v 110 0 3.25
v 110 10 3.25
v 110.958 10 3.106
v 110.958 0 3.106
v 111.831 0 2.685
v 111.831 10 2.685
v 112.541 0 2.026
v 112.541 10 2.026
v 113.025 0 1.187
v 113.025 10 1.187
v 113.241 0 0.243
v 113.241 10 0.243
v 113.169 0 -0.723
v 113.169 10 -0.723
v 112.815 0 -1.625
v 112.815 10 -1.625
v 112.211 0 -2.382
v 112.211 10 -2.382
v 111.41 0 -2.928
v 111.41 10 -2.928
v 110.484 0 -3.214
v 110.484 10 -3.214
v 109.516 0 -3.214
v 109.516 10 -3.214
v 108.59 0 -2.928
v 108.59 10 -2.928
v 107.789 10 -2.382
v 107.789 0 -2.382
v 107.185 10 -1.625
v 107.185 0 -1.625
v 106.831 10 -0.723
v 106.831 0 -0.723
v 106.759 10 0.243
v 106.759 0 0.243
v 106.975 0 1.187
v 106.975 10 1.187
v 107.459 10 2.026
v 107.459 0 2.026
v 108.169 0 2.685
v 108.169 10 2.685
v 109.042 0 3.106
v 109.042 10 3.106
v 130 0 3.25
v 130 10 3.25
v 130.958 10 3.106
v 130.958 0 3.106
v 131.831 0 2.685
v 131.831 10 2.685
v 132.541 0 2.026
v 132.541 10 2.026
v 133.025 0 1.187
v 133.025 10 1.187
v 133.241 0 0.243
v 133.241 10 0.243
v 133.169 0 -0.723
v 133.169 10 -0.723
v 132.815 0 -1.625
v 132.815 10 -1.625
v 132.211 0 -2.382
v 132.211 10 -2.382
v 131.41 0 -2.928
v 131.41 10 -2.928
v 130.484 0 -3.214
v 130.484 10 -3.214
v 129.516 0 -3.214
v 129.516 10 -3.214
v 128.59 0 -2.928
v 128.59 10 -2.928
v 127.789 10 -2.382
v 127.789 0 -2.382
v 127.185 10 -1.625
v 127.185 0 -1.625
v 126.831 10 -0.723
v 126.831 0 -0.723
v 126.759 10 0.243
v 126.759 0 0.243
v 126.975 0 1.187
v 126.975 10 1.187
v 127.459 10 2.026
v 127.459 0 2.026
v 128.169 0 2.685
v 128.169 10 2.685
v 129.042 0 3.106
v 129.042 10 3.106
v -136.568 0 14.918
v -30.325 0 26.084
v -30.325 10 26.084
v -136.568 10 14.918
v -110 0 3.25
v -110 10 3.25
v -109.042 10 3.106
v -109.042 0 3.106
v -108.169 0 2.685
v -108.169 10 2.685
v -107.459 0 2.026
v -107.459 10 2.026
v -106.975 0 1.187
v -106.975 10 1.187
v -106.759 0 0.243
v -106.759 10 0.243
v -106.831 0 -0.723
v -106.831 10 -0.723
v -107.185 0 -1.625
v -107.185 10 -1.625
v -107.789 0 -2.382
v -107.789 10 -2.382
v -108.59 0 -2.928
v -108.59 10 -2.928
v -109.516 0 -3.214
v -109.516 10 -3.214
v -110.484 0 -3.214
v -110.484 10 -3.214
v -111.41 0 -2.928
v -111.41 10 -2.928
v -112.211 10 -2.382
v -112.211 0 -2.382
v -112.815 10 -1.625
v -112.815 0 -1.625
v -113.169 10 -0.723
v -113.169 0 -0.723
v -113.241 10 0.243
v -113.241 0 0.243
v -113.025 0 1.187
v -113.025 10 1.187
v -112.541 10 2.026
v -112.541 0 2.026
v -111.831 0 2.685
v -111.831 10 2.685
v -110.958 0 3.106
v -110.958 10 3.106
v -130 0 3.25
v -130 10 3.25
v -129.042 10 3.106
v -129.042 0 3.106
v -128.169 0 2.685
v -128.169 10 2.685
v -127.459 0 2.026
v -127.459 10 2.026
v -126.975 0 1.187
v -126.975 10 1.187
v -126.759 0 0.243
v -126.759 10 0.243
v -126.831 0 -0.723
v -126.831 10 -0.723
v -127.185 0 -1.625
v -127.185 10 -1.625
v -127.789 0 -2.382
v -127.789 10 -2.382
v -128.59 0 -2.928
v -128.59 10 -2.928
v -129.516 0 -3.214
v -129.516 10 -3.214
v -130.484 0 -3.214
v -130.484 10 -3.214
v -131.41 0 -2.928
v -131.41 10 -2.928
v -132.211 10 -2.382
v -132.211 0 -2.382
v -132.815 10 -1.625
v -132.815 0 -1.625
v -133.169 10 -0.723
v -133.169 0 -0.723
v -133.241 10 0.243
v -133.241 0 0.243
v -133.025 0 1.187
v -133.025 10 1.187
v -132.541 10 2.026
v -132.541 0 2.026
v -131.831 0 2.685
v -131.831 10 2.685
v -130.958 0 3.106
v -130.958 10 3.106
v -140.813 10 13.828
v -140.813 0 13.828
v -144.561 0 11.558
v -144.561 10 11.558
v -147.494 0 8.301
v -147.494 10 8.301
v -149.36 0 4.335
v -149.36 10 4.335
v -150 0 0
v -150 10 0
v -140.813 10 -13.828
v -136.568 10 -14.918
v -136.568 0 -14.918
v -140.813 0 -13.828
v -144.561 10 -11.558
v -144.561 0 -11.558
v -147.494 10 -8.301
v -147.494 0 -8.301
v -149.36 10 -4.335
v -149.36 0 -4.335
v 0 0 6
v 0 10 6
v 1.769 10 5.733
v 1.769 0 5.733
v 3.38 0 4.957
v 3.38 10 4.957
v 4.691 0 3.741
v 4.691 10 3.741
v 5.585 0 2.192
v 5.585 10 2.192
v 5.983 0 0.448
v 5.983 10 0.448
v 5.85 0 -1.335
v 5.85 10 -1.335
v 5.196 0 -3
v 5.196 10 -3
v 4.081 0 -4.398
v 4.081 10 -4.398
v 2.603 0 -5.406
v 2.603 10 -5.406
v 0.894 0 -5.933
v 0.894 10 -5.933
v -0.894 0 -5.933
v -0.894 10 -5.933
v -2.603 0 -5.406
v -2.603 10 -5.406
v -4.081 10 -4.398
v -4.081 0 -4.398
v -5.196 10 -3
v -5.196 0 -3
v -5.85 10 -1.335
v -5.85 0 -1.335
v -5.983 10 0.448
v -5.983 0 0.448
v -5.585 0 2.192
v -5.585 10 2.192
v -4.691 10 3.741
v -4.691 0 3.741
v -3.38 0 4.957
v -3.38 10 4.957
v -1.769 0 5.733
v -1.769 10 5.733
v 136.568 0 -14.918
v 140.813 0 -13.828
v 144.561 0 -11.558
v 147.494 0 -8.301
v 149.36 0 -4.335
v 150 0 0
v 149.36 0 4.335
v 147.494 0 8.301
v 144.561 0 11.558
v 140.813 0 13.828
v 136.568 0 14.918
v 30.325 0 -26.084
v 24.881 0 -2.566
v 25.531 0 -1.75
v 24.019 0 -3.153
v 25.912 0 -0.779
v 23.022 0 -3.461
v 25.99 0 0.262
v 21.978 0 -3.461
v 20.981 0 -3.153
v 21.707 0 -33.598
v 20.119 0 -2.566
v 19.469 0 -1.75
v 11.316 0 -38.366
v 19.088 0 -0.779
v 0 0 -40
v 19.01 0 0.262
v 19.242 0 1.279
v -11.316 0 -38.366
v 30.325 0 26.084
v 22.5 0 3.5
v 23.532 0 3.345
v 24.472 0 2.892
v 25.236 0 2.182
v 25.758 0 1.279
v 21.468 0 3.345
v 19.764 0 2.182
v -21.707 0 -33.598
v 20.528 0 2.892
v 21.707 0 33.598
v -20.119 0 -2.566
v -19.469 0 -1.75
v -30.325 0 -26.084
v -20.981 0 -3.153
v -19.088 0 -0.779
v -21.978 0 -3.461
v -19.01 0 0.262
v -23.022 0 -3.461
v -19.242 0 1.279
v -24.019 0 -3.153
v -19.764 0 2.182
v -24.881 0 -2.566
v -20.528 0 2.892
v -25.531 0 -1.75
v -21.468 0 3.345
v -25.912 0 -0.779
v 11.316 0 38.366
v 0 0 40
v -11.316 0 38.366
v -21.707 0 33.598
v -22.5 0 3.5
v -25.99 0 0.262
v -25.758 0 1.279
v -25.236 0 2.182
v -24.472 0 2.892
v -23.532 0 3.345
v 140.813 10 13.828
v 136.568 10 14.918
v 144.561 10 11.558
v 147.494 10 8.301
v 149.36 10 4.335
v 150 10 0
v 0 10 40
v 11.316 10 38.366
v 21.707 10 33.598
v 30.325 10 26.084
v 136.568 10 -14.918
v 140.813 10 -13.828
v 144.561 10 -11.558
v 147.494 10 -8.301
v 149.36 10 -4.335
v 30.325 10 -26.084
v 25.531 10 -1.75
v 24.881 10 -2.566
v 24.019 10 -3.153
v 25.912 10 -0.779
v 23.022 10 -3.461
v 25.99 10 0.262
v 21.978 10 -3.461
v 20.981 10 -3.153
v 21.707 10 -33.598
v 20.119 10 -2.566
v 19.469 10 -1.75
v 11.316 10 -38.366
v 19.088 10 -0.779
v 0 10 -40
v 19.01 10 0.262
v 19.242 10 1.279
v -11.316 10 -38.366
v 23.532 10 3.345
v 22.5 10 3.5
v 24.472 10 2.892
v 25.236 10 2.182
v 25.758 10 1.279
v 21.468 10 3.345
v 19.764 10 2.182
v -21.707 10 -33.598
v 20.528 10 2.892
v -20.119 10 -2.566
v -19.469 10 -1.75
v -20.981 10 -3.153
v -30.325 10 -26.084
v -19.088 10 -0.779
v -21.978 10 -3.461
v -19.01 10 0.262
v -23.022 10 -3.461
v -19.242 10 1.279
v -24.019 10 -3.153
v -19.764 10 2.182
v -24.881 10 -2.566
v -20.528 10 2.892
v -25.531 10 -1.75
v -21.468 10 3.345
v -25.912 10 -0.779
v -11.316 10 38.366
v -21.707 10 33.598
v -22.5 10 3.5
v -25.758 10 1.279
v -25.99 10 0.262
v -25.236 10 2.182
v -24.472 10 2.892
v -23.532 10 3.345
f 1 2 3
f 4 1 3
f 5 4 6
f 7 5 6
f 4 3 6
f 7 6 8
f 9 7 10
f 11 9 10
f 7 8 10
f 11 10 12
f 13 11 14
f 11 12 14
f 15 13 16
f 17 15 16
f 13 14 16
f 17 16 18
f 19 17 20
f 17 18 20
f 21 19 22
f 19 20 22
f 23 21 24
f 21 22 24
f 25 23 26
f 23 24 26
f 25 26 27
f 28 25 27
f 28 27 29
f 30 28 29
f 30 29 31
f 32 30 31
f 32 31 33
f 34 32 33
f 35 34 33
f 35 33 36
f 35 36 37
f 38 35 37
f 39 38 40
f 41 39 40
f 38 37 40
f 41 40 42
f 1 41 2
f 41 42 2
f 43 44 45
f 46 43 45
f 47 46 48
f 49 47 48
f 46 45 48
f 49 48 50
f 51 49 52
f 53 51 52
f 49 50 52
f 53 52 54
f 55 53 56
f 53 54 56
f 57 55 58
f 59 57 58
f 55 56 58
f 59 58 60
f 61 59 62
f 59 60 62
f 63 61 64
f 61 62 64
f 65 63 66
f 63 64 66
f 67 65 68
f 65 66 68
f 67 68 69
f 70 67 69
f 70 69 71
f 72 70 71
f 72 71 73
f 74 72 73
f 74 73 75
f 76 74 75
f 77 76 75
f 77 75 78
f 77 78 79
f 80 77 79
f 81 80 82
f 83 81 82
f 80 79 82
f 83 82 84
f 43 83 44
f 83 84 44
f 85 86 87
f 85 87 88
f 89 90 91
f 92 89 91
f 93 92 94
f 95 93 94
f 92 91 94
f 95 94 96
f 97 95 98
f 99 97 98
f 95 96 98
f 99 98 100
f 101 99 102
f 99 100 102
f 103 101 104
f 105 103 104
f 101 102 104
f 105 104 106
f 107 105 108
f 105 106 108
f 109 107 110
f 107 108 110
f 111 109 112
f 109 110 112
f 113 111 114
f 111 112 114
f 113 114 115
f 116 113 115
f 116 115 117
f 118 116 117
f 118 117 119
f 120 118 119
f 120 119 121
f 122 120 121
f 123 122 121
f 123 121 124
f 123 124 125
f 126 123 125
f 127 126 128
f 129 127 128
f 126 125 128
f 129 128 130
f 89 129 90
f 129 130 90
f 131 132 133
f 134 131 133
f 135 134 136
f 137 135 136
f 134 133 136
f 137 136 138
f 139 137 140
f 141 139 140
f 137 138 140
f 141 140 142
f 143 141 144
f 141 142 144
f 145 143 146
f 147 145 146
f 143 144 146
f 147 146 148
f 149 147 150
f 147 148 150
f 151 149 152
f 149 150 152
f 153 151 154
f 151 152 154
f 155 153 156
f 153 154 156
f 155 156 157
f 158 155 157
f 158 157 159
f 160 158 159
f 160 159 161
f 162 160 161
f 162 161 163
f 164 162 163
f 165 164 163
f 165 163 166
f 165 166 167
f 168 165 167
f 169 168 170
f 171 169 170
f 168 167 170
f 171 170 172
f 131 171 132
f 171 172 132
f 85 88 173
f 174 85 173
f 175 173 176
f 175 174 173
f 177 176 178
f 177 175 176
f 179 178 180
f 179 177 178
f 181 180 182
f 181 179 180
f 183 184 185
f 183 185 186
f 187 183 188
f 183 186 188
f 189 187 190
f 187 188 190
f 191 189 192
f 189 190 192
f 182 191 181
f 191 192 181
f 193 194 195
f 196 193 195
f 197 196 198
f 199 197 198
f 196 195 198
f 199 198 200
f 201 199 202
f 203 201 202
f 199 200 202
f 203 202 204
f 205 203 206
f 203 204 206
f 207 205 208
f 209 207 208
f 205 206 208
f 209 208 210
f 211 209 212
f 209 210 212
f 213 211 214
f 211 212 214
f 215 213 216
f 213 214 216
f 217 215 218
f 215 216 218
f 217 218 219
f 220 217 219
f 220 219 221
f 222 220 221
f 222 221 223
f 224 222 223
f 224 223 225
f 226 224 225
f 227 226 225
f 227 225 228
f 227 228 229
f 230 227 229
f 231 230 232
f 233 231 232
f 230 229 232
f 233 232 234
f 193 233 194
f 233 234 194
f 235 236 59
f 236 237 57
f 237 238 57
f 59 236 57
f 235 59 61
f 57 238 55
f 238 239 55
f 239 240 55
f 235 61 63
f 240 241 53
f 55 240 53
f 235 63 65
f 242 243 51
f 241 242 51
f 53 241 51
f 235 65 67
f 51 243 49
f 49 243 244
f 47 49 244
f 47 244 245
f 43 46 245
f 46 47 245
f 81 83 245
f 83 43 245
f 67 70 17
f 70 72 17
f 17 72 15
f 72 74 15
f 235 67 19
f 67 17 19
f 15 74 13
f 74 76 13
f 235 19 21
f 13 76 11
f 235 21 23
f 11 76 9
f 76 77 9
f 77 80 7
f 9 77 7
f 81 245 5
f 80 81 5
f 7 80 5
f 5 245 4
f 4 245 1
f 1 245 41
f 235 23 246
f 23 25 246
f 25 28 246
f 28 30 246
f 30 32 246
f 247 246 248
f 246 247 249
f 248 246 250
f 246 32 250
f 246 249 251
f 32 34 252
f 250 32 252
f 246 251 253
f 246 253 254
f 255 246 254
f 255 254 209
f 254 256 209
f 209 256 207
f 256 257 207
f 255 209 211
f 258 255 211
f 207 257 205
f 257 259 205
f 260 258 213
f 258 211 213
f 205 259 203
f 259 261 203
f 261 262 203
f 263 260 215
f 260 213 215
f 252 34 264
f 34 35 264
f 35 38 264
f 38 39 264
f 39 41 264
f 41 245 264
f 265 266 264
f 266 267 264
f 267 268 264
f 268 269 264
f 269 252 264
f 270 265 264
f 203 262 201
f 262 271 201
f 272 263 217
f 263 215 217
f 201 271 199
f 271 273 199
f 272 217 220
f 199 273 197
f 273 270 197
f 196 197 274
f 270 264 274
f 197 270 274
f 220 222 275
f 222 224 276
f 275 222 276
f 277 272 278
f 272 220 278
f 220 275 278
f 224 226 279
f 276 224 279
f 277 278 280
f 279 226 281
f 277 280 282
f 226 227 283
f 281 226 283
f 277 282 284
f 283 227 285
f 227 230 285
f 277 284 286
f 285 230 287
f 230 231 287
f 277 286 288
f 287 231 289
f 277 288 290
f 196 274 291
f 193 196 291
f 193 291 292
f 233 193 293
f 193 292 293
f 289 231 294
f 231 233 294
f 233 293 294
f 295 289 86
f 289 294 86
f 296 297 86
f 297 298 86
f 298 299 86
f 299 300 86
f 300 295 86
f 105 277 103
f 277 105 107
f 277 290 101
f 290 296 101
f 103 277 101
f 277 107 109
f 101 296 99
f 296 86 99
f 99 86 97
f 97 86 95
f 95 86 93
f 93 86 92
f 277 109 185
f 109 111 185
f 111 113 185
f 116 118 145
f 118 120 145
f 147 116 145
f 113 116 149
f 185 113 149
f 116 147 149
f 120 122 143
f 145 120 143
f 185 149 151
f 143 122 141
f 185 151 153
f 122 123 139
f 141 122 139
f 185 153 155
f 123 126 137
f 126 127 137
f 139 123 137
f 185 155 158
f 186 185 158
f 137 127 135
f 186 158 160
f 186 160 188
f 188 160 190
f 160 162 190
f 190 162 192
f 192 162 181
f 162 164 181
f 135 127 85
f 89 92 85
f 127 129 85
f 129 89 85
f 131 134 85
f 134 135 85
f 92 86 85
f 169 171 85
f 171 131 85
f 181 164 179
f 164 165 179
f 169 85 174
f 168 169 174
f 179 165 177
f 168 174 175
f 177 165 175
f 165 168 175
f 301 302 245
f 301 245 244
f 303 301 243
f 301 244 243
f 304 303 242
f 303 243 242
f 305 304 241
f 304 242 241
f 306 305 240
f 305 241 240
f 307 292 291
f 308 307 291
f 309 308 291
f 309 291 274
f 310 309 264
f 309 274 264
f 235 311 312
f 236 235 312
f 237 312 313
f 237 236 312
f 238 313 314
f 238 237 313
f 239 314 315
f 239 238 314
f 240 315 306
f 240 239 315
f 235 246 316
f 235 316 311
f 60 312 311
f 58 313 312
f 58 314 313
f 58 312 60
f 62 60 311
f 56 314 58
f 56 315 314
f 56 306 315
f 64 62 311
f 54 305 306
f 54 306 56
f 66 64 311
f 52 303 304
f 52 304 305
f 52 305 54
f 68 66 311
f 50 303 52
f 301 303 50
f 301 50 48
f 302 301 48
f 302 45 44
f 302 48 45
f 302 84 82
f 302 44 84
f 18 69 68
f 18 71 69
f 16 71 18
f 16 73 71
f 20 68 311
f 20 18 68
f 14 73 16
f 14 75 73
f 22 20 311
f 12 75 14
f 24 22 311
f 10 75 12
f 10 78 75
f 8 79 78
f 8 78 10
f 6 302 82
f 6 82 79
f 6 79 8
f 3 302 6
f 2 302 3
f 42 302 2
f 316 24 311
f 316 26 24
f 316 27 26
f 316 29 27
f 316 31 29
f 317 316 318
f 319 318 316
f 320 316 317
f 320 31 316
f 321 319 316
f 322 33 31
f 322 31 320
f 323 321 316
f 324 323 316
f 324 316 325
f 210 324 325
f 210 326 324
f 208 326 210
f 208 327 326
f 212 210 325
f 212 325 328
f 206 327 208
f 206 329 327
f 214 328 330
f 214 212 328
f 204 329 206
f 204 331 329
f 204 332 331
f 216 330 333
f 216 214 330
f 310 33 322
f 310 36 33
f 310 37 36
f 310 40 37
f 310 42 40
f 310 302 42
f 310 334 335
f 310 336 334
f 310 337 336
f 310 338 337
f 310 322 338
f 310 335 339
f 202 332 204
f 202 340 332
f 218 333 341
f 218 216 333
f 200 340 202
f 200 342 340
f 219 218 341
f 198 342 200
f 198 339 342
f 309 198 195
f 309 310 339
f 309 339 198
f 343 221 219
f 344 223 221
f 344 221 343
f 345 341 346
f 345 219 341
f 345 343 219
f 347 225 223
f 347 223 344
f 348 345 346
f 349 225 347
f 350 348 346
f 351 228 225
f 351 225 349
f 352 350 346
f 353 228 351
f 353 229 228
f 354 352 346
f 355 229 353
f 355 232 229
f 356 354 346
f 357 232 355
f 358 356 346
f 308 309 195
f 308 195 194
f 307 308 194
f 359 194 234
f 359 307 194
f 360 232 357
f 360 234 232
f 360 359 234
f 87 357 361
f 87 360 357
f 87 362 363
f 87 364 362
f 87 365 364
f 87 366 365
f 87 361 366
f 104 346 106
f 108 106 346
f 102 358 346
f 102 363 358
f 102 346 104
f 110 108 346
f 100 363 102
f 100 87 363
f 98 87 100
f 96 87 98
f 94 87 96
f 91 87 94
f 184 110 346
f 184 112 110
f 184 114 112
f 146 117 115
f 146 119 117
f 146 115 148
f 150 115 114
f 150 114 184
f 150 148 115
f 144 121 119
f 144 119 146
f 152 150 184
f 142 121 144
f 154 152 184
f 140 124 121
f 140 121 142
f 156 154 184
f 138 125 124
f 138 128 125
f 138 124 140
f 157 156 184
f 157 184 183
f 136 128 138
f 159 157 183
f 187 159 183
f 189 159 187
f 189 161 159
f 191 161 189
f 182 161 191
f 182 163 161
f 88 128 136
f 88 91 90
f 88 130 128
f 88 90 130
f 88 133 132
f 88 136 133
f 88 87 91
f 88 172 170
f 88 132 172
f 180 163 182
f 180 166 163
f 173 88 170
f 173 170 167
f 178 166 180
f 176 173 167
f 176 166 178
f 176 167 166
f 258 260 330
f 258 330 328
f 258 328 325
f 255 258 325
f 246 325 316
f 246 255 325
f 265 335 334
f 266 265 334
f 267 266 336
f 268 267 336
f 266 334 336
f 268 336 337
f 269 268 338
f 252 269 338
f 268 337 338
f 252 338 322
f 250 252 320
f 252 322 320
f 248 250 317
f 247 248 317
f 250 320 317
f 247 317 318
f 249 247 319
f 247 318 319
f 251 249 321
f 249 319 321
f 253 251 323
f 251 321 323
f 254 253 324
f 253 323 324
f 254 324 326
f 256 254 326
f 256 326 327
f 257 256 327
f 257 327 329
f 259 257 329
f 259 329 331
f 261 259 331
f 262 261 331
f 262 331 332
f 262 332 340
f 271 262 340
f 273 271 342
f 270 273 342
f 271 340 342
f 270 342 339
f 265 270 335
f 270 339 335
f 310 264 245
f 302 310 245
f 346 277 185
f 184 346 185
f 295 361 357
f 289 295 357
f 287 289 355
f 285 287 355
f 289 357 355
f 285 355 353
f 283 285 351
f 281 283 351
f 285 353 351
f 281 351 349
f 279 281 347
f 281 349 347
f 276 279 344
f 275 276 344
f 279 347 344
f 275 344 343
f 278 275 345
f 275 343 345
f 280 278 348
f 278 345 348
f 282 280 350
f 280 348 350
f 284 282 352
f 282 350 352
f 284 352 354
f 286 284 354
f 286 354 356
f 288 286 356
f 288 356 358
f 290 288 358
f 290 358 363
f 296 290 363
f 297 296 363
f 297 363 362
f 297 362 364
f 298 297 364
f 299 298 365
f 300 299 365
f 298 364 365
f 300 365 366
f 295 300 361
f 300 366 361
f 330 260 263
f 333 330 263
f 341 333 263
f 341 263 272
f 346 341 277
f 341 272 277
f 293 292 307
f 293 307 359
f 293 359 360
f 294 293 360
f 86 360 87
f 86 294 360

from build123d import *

# Parameters (mm, degrees)
BOSS_EXTRU_1_DEPTH      = 10
SYM_TRIE8_COPY_1_DEPTH  = 10
ESQUISSE2_R             = 3.5
ESQUISSE2_R_2           = 6
ESQUISSE2_R_3           = 3.25
ENL_V_MAT_EXTRU_1_DEPTH = 10


with BuildPart() as part:
    # Esquisse1 → Boss.-Extru.1 (new body)
    with BuildSketch(Plane(origin=(0, 0, 0), x_dir=(1, 0, 0), z_dir=(0, 1, 0))):
        with BuildLine():
            Line((-30.324962458, 26.084413966), (-136.567926949, 14.917828431))
            ThreePointArc((-136.567926949, 14.917828431), (-146.147172382, 10.036959095), (-150, 0))
            Line((-150, 0), (0, 0))
            Line((0, 0), (0, 40))
            ThreePointArc((0, 40), (-16.682677264, 36.355031004), (-30.324962458, 26.084413966))
        make_face()
    boss_extru_1 = extrude(amount=BOSS_EXTRU_1_DEPTH)

    # Symétrie1: Boss.-Extru.1 across plane
    add(boss_extru_1.mirror(Plane(origin=(-150, 10, 0), x_dir=(1, 0, 0), z_dir=(0, 0, -1))))

    # Symétrie8: Boss.-Extru.1 across plane
    add(boss_extru_1.mirror(Plane(origin=(0, 0, 0), x_dir=(0, 0, 1), z_dir=(1, 0, 0))))

    # Symétrie8 copy 1 sketch → Symétrie8 copy 1 (add)
    with BuildSketch(Plane(origin=(0, 0, 0), x_dir=(-1, 0, 0), z_dir=(0, 1, 0))):
        with BuildLine():
            Line((-30.324962458, 26.084413966), (-136.567926949, 14.917828431))
            ThreePointArc((-136.567926949, 14.917828431), (-146.147172382, 10.036959095), (-150, 0))
            Line((-150, 0), (0, 0))
            Line((0, 0), (0, 40))
            ThreePointArc((0, 40), (-16.682677264, 36.355031004), (-30.324962458, 26.084413966))
        make_face()
    extrude(amount=SYM_TRIE8_COPY_1_DEPTH)

    # Esquisse2 → Enlèv. mat.-Extru.1 (cut)
    with BuildSketch(Plane(origin=(0, 10, 0), x_dir=(1, 0, 0), z_dir=(0, 1, 0))):
        with Locations(Location((-22.5, 0, 0), (0, 0, 270))):
            Circle(ESQUISSE2_R)
        with Locations(Location((22.5, 0, 0), (0, 0, 270))):
            Circle(ESQUISSE2_R)
        with Locations(Location((0, 0, 0), (0, 0, 270))):
            Circle(ESQUISSE2_R_2)
        with Locations(Location((-110, 0, 0), (0, 0, 270))):
            Circle(ESQUISSE2_R_3)
        with Locations(Location((-130, 0, 0), (0, 0, 270))):
            Circle(ESQUISSE2_R_3)
        with Locations(Location((110, 0, 0), (0, 0, 270))):
            Circle(ESQUISSE2_R_3)
        with Locations(Location((130, 0, 0), (0, 0, 270))):
            Circle(ESQUISSE2_R_3)
    extrude(amount=-ENL_V_MAT_EXTRU_1_DEPTH, mode=Mode.SUBTRACT)


solid = part.part
